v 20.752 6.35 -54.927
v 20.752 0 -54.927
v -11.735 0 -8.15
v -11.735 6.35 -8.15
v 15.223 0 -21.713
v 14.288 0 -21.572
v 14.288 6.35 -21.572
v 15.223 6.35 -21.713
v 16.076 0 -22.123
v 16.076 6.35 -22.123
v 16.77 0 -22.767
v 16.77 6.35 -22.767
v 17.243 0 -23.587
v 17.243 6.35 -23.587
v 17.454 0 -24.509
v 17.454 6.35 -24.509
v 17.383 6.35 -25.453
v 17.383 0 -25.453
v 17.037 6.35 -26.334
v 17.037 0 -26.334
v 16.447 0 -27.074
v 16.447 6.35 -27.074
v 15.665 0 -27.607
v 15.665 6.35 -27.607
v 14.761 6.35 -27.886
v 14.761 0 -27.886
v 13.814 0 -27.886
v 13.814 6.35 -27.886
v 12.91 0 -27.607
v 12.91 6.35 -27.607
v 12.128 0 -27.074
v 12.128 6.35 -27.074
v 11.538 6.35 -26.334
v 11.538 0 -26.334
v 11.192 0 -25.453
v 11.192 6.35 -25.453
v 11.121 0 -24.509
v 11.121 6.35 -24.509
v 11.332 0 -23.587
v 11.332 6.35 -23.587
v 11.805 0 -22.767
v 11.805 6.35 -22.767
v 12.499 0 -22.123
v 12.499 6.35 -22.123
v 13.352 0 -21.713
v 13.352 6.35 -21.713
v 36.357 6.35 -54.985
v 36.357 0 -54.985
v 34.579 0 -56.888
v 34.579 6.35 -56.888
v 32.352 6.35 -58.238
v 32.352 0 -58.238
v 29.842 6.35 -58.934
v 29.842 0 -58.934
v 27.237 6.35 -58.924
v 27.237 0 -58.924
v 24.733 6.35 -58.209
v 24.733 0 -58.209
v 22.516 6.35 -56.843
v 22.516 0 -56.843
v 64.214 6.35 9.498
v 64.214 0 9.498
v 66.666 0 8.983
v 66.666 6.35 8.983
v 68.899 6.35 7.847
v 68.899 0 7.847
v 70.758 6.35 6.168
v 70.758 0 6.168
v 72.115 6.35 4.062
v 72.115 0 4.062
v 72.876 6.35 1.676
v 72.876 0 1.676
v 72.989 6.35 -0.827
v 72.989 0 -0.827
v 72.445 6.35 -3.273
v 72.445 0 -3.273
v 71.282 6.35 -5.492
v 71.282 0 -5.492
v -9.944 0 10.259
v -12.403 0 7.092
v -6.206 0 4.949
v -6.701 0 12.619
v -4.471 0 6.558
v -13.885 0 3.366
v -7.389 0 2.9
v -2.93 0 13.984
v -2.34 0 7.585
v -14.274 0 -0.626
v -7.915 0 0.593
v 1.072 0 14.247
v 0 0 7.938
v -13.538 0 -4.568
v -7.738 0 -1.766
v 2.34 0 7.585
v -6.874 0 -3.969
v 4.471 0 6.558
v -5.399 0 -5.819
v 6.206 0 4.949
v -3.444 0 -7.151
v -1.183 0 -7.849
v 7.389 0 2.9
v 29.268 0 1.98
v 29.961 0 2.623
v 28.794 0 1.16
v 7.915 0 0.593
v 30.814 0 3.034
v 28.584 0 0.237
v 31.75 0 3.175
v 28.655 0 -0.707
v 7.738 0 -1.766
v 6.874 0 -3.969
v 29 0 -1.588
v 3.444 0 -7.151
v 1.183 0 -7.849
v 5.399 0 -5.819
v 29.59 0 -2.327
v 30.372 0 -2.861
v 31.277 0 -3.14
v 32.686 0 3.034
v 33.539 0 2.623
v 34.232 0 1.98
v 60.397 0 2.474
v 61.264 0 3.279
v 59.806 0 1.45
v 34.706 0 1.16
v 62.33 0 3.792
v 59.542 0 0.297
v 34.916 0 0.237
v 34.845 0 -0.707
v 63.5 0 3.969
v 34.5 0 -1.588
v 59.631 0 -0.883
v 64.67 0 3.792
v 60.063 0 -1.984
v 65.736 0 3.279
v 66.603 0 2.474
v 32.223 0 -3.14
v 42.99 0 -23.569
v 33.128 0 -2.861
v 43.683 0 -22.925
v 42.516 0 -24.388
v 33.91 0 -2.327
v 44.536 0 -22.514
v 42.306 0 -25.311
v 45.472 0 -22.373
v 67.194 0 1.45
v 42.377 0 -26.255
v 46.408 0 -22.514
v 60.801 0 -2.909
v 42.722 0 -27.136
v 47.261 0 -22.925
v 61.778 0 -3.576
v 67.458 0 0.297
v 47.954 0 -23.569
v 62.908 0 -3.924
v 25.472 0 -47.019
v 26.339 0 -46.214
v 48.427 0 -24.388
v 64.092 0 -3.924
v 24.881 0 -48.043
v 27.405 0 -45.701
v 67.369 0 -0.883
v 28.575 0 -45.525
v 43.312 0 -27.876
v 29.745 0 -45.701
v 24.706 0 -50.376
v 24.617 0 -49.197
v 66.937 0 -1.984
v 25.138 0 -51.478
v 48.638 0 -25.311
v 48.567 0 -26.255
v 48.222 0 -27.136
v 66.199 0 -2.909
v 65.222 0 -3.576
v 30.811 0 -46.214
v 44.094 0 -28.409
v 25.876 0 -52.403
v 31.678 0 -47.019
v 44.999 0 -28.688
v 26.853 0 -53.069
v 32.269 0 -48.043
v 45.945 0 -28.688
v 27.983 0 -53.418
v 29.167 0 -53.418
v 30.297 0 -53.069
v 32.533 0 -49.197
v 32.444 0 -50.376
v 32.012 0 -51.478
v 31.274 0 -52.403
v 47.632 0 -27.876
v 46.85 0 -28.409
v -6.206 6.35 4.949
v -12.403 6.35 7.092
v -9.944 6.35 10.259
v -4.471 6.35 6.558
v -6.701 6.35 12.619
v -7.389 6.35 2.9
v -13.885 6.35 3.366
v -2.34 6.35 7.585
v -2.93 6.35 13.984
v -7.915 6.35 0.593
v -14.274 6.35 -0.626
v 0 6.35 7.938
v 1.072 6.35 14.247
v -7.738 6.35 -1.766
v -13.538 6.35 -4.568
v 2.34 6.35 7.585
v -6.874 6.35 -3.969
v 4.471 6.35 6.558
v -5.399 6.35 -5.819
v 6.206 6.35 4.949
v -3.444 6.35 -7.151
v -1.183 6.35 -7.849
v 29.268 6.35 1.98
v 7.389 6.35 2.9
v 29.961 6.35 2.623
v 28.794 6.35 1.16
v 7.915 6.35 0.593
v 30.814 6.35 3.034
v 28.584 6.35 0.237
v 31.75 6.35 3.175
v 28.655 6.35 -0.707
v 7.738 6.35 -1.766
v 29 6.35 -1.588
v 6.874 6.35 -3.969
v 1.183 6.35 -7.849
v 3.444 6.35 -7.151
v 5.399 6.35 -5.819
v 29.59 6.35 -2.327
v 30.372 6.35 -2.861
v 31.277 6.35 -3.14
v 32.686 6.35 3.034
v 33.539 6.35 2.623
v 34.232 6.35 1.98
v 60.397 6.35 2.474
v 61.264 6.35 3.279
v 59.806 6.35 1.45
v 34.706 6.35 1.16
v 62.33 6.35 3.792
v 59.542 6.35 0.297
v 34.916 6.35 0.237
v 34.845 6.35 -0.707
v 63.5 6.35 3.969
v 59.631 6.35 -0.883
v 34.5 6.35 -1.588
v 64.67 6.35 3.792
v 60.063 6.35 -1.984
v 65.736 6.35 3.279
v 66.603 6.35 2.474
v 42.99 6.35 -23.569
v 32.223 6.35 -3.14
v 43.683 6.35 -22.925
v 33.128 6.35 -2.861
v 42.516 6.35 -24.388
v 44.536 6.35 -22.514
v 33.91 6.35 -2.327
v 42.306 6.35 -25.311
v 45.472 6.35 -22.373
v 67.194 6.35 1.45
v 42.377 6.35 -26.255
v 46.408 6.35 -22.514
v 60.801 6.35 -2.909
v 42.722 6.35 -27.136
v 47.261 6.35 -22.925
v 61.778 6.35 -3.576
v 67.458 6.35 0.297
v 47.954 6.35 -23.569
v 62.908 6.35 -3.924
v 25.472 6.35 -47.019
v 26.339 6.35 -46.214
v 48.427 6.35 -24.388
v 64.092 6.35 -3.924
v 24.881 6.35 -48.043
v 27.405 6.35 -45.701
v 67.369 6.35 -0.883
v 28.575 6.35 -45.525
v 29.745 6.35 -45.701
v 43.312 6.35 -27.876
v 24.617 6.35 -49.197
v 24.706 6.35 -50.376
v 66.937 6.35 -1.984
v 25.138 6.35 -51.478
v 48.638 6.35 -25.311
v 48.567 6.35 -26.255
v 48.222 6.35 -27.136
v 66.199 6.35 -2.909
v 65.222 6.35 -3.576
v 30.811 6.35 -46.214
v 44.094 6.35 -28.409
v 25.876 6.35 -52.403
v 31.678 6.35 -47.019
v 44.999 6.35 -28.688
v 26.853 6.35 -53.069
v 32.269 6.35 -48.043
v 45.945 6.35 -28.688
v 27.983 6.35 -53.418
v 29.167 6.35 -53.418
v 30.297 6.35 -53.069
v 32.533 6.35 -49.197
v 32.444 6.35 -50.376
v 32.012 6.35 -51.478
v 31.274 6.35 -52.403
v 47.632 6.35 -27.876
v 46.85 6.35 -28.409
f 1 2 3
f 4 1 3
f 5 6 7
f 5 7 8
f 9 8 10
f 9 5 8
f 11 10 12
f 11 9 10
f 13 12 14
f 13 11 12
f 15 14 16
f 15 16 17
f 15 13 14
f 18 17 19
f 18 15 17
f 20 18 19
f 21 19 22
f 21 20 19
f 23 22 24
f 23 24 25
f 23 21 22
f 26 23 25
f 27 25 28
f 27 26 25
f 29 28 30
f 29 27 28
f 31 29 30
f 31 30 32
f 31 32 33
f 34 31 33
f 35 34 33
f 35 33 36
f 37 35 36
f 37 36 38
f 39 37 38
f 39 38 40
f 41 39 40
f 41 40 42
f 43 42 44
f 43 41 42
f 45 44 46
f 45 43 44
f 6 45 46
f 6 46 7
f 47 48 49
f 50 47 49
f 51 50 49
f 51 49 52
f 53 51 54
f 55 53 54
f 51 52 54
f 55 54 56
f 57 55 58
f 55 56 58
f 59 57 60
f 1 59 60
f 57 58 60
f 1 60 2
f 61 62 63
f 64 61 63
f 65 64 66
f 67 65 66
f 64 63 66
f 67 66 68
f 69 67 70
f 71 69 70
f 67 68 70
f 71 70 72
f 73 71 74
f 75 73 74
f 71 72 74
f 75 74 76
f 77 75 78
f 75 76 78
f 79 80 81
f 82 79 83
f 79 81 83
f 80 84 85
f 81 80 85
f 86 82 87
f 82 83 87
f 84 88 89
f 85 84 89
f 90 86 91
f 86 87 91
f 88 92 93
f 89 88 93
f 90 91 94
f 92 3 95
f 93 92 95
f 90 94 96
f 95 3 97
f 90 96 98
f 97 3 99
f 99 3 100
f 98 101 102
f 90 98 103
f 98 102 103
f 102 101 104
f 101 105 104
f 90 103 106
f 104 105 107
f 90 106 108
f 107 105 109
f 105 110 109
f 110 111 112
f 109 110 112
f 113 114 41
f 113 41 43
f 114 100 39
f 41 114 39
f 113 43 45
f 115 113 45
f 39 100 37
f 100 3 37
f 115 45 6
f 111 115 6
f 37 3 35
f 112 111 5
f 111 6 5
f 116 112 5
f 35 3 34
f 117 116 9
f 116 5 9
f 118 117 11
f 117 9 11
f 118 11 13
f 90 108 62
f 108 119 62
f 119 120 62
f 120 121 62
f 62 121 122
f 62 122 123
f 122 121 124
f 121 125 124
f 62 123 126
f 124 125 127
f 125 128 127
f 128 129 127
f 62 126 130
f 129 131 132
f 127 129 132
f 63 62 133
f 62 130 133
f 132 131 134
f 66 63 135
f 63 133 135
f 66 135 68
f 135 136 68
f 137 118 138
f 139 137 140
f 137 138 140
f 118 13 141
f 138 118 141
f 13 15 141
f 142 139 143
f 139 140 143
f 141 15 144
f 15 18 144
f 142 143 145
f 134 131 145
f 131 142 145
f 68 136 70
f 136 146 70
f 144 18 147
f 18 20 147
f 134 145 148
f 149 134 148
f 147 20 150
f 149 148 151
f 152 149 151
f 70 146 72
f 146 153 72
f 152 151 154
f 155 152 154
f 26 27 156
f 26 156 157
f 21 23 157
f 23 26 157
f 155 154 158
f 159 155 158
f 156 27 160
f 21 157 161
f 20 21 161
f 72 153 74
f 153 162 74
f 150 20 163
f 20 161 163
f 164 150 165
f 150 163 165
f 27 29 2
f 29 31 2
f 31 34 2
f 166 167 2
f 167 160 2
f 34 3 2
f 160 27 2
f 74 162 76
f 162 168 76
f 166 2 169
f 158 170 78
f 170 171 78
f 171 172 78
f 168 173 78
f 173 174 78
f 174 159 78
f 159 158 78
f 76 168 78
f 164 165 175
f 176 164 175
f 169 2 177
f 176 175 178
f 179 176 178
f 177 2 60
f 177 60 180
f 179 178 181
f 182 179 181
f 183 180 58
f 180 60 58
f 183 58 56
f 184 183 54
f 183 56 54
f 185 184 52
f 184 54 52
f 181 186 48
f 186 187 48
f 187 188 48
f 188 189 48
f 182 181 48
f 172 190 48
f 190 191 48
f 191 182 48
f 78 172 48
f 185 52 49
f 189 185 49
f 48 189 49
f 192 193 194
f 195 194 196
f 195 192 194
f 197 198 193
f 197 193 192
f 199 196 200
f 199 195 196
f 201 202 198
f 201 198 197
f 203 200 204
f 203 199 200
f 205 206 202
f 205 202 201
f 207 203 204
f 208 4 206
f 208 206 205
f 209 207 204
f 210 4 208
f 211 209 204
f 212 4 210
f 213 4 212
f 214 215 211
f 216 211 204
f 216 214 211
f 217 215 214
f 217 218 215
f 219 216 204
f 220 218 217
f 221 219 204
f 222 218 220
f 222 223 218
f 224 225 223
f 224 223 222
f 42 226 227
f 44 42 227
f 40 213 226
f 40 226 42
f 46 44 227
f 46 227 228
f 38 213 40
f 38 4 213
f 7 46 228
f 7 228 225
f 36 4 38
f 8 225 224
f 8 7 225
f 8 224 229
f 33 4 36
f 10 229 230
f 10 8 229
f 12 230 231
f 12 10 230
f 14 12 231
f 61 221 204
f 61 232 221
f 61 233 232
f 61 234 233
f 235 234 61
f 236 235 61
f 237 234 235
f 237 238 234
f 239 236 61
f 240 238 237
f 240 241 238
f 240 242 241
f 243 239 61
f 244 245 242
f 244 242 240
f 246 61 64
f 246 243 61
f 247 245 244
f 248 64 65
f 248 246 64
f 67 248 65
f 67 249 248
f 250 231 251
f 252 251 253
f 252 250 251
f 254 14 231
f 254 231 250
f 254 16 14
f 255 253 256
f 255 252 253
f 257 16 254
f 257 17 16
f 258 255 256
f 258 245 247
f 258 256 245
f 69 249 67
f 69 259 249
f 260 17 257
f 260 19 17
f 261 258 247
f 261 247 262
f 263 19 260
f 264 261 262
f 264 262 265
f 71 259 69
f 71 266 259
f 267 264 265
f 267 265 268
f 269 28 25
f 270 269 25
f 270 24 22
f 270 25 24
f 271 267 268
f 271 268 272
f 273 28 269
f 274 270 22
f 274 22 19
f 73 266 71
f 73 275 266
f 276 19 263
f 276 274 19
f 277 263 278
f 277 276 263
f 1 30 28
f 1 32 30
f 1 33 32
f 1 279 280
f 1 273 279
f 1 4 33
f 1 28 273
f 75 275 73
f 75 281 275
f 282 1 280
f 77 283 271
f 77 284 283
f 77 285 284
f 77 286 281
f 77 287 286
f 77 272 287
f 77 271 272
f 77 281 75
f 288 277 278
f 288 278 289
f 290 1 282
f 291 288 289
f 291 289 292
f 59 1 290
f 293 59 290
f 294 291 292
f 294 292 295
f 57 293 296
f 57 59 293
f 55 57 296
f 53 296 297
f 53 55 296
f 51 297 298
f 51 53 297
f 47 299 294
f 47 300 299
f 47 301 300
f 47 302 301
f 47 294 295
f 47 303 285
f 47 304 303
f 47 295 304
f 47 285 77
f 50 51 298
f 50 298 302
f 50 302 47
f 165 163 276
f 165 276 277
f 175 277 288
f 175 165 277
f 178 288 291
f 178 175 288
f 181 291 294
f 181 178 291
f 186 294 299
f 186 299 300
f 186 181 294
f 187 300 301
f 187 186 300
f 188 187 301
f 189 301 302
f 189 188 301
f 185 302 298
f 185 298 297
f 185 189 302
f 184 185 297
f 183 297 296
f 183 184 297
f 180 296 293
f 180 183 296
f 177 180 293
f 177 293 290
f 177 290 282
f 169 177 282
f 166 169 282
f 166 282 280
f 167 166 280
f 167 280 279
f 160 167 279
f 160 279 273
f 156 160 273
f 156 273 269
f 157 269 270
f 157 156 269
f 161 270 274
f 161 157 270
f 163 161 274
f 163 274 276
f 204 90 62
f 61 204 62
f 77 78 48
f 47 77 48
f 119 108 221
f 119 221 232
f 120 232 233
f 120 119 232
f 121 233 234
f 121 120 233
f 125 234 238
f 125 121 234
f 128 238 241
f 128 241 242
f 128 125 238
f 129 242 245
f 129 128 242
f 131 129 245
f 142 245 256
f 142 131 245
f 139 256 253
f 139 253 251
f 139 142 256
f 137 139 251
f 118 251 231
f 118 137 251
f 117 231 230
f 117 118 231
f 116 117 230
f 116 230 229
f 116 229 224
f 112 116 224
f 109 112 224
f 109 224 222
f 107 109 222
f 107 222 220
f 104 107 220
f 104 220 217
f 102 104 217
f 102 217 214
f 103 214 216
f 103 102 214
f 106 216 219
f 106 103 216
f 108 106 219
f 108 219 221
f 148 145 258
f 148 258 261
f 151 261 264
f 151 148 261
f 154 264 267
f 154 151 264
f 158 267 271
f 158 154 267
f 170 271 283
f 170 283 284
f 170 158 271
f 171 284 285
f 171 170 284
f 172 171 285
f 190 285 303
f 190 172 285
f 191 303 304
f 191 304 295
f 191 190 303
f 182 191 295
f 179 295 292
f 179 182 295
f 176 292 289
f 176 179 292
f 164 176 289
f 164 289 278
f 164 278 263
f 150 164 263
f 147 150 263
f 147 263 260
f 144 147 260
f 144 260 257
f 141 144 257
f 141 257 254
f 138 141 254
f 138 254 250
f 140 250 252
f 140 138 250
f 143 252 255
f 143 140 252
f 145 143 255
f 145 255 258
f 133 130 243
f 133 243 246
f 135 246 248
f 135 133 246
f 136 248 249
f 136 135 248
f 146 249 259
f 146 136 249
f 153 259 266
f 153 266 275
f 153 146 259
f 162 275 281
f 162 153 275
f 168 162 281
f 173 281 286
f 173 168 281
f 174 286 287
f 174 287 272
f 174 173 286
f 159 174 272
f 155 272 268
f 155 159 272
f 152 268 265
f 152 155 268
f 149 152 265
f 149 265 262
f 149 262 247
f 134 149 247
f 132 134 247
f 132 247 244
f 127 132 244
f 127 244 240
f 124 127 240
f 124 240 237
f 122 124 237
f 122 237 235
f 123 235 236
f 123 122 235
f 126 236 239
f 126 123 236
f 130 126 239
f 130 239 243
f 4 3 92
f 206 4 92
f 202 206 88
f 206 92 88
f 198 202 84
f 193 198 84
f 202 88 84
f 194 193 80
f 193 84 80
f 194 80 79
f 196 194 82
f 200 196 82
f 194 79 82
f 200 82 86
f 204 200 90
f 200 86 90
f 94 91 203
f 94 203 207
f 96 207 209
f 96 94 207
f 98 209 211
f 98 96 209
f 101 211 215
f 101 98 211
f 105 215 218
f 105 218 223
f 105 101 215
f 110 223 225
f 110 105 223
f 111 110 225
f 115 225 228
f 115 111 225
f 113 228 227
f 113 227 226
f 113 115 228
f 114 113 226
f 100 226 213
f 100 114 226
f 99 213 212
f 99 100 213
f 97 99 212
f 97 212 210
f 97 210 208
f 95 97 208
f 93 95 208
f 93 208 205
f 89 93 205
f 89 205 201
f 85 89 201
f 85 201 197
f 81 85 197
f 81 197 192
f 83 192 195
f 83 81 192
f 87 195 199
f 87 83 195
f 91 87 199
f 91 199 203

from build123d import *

# Parameters (mm, degrees)
SKETCH1_R           = 3.96875
SKETCH1_R_2         = 7.9375
SKETCH1_R_3         = 3.175
BOSS_EXTRUDE1_DEPTH = 6.35


with BuildPart() as part:
    # Sketch1 → Boss-Extrude1 (new body)
    with BuildSketch(Plane(origin=(0, 0, 0), x_dir=(1, 0, 0), z_dir=(0, 1, 0))):
        with BuildLine():
            Line((1.0715625, -14.247259739), (64.214375, -9.498173159))
            ThreePointArc((64.214375, -9.498173159), (72.11528772, -4.062319842), (71.282469536, 5.491702188))
            Line((71.282469536, 5.491702188), (36.357469536, 54.985054015))
            ThreePointArc((36.357469536, 54.985054015), (28.539380338, 59.018285224), (20.751674914, 54.926694223))
            Line((20.751674914, 54.926694223), (-11.734987629, 8.150013595))
            ThreePointArc((-11.734987629, 8.150013595), (-12.403089215, -7.091969697), (1.0715625, -14.247259739))
        make_face()
        with Locations(Location((28.575, 49.493351826, 0), (0, 0, 270))):
            Circle(SKETCH1_R, mode=Mode.SUBTRACT)
        with Locations(Location((0, 0, 0), (0, 0, 270))):
            Circle(SKETCH1_R_2, mode=Mode.SUBTRACT)
        with Locations(Location((63.5, 0, 0), (0, 0, 270))):
            Circle(SKETCH1_R, mode=Mode.SUBTRACT)
        with Locations(Location((14.2875, 24.746675913, 0), (0, 0, 270))):
            Circle(SKETCH1_R_3, mode=Mode.SUBTRACT)
        with Locations(Location((31.75, 0, 0), (0, 0, 270))):
            Circle(SKETCH1_R_3, mode=Mode.SUBTRACT)
        with Locations(Location((45.471967279, 25.5481107, 0), (0, 0, 270))):
            Circle(SKETCH1_R_3, mode=Mode.SUBTRACT)
    extrude(amount=BOSS_EXTRUDE1_DEPTH)


solid = part.part
